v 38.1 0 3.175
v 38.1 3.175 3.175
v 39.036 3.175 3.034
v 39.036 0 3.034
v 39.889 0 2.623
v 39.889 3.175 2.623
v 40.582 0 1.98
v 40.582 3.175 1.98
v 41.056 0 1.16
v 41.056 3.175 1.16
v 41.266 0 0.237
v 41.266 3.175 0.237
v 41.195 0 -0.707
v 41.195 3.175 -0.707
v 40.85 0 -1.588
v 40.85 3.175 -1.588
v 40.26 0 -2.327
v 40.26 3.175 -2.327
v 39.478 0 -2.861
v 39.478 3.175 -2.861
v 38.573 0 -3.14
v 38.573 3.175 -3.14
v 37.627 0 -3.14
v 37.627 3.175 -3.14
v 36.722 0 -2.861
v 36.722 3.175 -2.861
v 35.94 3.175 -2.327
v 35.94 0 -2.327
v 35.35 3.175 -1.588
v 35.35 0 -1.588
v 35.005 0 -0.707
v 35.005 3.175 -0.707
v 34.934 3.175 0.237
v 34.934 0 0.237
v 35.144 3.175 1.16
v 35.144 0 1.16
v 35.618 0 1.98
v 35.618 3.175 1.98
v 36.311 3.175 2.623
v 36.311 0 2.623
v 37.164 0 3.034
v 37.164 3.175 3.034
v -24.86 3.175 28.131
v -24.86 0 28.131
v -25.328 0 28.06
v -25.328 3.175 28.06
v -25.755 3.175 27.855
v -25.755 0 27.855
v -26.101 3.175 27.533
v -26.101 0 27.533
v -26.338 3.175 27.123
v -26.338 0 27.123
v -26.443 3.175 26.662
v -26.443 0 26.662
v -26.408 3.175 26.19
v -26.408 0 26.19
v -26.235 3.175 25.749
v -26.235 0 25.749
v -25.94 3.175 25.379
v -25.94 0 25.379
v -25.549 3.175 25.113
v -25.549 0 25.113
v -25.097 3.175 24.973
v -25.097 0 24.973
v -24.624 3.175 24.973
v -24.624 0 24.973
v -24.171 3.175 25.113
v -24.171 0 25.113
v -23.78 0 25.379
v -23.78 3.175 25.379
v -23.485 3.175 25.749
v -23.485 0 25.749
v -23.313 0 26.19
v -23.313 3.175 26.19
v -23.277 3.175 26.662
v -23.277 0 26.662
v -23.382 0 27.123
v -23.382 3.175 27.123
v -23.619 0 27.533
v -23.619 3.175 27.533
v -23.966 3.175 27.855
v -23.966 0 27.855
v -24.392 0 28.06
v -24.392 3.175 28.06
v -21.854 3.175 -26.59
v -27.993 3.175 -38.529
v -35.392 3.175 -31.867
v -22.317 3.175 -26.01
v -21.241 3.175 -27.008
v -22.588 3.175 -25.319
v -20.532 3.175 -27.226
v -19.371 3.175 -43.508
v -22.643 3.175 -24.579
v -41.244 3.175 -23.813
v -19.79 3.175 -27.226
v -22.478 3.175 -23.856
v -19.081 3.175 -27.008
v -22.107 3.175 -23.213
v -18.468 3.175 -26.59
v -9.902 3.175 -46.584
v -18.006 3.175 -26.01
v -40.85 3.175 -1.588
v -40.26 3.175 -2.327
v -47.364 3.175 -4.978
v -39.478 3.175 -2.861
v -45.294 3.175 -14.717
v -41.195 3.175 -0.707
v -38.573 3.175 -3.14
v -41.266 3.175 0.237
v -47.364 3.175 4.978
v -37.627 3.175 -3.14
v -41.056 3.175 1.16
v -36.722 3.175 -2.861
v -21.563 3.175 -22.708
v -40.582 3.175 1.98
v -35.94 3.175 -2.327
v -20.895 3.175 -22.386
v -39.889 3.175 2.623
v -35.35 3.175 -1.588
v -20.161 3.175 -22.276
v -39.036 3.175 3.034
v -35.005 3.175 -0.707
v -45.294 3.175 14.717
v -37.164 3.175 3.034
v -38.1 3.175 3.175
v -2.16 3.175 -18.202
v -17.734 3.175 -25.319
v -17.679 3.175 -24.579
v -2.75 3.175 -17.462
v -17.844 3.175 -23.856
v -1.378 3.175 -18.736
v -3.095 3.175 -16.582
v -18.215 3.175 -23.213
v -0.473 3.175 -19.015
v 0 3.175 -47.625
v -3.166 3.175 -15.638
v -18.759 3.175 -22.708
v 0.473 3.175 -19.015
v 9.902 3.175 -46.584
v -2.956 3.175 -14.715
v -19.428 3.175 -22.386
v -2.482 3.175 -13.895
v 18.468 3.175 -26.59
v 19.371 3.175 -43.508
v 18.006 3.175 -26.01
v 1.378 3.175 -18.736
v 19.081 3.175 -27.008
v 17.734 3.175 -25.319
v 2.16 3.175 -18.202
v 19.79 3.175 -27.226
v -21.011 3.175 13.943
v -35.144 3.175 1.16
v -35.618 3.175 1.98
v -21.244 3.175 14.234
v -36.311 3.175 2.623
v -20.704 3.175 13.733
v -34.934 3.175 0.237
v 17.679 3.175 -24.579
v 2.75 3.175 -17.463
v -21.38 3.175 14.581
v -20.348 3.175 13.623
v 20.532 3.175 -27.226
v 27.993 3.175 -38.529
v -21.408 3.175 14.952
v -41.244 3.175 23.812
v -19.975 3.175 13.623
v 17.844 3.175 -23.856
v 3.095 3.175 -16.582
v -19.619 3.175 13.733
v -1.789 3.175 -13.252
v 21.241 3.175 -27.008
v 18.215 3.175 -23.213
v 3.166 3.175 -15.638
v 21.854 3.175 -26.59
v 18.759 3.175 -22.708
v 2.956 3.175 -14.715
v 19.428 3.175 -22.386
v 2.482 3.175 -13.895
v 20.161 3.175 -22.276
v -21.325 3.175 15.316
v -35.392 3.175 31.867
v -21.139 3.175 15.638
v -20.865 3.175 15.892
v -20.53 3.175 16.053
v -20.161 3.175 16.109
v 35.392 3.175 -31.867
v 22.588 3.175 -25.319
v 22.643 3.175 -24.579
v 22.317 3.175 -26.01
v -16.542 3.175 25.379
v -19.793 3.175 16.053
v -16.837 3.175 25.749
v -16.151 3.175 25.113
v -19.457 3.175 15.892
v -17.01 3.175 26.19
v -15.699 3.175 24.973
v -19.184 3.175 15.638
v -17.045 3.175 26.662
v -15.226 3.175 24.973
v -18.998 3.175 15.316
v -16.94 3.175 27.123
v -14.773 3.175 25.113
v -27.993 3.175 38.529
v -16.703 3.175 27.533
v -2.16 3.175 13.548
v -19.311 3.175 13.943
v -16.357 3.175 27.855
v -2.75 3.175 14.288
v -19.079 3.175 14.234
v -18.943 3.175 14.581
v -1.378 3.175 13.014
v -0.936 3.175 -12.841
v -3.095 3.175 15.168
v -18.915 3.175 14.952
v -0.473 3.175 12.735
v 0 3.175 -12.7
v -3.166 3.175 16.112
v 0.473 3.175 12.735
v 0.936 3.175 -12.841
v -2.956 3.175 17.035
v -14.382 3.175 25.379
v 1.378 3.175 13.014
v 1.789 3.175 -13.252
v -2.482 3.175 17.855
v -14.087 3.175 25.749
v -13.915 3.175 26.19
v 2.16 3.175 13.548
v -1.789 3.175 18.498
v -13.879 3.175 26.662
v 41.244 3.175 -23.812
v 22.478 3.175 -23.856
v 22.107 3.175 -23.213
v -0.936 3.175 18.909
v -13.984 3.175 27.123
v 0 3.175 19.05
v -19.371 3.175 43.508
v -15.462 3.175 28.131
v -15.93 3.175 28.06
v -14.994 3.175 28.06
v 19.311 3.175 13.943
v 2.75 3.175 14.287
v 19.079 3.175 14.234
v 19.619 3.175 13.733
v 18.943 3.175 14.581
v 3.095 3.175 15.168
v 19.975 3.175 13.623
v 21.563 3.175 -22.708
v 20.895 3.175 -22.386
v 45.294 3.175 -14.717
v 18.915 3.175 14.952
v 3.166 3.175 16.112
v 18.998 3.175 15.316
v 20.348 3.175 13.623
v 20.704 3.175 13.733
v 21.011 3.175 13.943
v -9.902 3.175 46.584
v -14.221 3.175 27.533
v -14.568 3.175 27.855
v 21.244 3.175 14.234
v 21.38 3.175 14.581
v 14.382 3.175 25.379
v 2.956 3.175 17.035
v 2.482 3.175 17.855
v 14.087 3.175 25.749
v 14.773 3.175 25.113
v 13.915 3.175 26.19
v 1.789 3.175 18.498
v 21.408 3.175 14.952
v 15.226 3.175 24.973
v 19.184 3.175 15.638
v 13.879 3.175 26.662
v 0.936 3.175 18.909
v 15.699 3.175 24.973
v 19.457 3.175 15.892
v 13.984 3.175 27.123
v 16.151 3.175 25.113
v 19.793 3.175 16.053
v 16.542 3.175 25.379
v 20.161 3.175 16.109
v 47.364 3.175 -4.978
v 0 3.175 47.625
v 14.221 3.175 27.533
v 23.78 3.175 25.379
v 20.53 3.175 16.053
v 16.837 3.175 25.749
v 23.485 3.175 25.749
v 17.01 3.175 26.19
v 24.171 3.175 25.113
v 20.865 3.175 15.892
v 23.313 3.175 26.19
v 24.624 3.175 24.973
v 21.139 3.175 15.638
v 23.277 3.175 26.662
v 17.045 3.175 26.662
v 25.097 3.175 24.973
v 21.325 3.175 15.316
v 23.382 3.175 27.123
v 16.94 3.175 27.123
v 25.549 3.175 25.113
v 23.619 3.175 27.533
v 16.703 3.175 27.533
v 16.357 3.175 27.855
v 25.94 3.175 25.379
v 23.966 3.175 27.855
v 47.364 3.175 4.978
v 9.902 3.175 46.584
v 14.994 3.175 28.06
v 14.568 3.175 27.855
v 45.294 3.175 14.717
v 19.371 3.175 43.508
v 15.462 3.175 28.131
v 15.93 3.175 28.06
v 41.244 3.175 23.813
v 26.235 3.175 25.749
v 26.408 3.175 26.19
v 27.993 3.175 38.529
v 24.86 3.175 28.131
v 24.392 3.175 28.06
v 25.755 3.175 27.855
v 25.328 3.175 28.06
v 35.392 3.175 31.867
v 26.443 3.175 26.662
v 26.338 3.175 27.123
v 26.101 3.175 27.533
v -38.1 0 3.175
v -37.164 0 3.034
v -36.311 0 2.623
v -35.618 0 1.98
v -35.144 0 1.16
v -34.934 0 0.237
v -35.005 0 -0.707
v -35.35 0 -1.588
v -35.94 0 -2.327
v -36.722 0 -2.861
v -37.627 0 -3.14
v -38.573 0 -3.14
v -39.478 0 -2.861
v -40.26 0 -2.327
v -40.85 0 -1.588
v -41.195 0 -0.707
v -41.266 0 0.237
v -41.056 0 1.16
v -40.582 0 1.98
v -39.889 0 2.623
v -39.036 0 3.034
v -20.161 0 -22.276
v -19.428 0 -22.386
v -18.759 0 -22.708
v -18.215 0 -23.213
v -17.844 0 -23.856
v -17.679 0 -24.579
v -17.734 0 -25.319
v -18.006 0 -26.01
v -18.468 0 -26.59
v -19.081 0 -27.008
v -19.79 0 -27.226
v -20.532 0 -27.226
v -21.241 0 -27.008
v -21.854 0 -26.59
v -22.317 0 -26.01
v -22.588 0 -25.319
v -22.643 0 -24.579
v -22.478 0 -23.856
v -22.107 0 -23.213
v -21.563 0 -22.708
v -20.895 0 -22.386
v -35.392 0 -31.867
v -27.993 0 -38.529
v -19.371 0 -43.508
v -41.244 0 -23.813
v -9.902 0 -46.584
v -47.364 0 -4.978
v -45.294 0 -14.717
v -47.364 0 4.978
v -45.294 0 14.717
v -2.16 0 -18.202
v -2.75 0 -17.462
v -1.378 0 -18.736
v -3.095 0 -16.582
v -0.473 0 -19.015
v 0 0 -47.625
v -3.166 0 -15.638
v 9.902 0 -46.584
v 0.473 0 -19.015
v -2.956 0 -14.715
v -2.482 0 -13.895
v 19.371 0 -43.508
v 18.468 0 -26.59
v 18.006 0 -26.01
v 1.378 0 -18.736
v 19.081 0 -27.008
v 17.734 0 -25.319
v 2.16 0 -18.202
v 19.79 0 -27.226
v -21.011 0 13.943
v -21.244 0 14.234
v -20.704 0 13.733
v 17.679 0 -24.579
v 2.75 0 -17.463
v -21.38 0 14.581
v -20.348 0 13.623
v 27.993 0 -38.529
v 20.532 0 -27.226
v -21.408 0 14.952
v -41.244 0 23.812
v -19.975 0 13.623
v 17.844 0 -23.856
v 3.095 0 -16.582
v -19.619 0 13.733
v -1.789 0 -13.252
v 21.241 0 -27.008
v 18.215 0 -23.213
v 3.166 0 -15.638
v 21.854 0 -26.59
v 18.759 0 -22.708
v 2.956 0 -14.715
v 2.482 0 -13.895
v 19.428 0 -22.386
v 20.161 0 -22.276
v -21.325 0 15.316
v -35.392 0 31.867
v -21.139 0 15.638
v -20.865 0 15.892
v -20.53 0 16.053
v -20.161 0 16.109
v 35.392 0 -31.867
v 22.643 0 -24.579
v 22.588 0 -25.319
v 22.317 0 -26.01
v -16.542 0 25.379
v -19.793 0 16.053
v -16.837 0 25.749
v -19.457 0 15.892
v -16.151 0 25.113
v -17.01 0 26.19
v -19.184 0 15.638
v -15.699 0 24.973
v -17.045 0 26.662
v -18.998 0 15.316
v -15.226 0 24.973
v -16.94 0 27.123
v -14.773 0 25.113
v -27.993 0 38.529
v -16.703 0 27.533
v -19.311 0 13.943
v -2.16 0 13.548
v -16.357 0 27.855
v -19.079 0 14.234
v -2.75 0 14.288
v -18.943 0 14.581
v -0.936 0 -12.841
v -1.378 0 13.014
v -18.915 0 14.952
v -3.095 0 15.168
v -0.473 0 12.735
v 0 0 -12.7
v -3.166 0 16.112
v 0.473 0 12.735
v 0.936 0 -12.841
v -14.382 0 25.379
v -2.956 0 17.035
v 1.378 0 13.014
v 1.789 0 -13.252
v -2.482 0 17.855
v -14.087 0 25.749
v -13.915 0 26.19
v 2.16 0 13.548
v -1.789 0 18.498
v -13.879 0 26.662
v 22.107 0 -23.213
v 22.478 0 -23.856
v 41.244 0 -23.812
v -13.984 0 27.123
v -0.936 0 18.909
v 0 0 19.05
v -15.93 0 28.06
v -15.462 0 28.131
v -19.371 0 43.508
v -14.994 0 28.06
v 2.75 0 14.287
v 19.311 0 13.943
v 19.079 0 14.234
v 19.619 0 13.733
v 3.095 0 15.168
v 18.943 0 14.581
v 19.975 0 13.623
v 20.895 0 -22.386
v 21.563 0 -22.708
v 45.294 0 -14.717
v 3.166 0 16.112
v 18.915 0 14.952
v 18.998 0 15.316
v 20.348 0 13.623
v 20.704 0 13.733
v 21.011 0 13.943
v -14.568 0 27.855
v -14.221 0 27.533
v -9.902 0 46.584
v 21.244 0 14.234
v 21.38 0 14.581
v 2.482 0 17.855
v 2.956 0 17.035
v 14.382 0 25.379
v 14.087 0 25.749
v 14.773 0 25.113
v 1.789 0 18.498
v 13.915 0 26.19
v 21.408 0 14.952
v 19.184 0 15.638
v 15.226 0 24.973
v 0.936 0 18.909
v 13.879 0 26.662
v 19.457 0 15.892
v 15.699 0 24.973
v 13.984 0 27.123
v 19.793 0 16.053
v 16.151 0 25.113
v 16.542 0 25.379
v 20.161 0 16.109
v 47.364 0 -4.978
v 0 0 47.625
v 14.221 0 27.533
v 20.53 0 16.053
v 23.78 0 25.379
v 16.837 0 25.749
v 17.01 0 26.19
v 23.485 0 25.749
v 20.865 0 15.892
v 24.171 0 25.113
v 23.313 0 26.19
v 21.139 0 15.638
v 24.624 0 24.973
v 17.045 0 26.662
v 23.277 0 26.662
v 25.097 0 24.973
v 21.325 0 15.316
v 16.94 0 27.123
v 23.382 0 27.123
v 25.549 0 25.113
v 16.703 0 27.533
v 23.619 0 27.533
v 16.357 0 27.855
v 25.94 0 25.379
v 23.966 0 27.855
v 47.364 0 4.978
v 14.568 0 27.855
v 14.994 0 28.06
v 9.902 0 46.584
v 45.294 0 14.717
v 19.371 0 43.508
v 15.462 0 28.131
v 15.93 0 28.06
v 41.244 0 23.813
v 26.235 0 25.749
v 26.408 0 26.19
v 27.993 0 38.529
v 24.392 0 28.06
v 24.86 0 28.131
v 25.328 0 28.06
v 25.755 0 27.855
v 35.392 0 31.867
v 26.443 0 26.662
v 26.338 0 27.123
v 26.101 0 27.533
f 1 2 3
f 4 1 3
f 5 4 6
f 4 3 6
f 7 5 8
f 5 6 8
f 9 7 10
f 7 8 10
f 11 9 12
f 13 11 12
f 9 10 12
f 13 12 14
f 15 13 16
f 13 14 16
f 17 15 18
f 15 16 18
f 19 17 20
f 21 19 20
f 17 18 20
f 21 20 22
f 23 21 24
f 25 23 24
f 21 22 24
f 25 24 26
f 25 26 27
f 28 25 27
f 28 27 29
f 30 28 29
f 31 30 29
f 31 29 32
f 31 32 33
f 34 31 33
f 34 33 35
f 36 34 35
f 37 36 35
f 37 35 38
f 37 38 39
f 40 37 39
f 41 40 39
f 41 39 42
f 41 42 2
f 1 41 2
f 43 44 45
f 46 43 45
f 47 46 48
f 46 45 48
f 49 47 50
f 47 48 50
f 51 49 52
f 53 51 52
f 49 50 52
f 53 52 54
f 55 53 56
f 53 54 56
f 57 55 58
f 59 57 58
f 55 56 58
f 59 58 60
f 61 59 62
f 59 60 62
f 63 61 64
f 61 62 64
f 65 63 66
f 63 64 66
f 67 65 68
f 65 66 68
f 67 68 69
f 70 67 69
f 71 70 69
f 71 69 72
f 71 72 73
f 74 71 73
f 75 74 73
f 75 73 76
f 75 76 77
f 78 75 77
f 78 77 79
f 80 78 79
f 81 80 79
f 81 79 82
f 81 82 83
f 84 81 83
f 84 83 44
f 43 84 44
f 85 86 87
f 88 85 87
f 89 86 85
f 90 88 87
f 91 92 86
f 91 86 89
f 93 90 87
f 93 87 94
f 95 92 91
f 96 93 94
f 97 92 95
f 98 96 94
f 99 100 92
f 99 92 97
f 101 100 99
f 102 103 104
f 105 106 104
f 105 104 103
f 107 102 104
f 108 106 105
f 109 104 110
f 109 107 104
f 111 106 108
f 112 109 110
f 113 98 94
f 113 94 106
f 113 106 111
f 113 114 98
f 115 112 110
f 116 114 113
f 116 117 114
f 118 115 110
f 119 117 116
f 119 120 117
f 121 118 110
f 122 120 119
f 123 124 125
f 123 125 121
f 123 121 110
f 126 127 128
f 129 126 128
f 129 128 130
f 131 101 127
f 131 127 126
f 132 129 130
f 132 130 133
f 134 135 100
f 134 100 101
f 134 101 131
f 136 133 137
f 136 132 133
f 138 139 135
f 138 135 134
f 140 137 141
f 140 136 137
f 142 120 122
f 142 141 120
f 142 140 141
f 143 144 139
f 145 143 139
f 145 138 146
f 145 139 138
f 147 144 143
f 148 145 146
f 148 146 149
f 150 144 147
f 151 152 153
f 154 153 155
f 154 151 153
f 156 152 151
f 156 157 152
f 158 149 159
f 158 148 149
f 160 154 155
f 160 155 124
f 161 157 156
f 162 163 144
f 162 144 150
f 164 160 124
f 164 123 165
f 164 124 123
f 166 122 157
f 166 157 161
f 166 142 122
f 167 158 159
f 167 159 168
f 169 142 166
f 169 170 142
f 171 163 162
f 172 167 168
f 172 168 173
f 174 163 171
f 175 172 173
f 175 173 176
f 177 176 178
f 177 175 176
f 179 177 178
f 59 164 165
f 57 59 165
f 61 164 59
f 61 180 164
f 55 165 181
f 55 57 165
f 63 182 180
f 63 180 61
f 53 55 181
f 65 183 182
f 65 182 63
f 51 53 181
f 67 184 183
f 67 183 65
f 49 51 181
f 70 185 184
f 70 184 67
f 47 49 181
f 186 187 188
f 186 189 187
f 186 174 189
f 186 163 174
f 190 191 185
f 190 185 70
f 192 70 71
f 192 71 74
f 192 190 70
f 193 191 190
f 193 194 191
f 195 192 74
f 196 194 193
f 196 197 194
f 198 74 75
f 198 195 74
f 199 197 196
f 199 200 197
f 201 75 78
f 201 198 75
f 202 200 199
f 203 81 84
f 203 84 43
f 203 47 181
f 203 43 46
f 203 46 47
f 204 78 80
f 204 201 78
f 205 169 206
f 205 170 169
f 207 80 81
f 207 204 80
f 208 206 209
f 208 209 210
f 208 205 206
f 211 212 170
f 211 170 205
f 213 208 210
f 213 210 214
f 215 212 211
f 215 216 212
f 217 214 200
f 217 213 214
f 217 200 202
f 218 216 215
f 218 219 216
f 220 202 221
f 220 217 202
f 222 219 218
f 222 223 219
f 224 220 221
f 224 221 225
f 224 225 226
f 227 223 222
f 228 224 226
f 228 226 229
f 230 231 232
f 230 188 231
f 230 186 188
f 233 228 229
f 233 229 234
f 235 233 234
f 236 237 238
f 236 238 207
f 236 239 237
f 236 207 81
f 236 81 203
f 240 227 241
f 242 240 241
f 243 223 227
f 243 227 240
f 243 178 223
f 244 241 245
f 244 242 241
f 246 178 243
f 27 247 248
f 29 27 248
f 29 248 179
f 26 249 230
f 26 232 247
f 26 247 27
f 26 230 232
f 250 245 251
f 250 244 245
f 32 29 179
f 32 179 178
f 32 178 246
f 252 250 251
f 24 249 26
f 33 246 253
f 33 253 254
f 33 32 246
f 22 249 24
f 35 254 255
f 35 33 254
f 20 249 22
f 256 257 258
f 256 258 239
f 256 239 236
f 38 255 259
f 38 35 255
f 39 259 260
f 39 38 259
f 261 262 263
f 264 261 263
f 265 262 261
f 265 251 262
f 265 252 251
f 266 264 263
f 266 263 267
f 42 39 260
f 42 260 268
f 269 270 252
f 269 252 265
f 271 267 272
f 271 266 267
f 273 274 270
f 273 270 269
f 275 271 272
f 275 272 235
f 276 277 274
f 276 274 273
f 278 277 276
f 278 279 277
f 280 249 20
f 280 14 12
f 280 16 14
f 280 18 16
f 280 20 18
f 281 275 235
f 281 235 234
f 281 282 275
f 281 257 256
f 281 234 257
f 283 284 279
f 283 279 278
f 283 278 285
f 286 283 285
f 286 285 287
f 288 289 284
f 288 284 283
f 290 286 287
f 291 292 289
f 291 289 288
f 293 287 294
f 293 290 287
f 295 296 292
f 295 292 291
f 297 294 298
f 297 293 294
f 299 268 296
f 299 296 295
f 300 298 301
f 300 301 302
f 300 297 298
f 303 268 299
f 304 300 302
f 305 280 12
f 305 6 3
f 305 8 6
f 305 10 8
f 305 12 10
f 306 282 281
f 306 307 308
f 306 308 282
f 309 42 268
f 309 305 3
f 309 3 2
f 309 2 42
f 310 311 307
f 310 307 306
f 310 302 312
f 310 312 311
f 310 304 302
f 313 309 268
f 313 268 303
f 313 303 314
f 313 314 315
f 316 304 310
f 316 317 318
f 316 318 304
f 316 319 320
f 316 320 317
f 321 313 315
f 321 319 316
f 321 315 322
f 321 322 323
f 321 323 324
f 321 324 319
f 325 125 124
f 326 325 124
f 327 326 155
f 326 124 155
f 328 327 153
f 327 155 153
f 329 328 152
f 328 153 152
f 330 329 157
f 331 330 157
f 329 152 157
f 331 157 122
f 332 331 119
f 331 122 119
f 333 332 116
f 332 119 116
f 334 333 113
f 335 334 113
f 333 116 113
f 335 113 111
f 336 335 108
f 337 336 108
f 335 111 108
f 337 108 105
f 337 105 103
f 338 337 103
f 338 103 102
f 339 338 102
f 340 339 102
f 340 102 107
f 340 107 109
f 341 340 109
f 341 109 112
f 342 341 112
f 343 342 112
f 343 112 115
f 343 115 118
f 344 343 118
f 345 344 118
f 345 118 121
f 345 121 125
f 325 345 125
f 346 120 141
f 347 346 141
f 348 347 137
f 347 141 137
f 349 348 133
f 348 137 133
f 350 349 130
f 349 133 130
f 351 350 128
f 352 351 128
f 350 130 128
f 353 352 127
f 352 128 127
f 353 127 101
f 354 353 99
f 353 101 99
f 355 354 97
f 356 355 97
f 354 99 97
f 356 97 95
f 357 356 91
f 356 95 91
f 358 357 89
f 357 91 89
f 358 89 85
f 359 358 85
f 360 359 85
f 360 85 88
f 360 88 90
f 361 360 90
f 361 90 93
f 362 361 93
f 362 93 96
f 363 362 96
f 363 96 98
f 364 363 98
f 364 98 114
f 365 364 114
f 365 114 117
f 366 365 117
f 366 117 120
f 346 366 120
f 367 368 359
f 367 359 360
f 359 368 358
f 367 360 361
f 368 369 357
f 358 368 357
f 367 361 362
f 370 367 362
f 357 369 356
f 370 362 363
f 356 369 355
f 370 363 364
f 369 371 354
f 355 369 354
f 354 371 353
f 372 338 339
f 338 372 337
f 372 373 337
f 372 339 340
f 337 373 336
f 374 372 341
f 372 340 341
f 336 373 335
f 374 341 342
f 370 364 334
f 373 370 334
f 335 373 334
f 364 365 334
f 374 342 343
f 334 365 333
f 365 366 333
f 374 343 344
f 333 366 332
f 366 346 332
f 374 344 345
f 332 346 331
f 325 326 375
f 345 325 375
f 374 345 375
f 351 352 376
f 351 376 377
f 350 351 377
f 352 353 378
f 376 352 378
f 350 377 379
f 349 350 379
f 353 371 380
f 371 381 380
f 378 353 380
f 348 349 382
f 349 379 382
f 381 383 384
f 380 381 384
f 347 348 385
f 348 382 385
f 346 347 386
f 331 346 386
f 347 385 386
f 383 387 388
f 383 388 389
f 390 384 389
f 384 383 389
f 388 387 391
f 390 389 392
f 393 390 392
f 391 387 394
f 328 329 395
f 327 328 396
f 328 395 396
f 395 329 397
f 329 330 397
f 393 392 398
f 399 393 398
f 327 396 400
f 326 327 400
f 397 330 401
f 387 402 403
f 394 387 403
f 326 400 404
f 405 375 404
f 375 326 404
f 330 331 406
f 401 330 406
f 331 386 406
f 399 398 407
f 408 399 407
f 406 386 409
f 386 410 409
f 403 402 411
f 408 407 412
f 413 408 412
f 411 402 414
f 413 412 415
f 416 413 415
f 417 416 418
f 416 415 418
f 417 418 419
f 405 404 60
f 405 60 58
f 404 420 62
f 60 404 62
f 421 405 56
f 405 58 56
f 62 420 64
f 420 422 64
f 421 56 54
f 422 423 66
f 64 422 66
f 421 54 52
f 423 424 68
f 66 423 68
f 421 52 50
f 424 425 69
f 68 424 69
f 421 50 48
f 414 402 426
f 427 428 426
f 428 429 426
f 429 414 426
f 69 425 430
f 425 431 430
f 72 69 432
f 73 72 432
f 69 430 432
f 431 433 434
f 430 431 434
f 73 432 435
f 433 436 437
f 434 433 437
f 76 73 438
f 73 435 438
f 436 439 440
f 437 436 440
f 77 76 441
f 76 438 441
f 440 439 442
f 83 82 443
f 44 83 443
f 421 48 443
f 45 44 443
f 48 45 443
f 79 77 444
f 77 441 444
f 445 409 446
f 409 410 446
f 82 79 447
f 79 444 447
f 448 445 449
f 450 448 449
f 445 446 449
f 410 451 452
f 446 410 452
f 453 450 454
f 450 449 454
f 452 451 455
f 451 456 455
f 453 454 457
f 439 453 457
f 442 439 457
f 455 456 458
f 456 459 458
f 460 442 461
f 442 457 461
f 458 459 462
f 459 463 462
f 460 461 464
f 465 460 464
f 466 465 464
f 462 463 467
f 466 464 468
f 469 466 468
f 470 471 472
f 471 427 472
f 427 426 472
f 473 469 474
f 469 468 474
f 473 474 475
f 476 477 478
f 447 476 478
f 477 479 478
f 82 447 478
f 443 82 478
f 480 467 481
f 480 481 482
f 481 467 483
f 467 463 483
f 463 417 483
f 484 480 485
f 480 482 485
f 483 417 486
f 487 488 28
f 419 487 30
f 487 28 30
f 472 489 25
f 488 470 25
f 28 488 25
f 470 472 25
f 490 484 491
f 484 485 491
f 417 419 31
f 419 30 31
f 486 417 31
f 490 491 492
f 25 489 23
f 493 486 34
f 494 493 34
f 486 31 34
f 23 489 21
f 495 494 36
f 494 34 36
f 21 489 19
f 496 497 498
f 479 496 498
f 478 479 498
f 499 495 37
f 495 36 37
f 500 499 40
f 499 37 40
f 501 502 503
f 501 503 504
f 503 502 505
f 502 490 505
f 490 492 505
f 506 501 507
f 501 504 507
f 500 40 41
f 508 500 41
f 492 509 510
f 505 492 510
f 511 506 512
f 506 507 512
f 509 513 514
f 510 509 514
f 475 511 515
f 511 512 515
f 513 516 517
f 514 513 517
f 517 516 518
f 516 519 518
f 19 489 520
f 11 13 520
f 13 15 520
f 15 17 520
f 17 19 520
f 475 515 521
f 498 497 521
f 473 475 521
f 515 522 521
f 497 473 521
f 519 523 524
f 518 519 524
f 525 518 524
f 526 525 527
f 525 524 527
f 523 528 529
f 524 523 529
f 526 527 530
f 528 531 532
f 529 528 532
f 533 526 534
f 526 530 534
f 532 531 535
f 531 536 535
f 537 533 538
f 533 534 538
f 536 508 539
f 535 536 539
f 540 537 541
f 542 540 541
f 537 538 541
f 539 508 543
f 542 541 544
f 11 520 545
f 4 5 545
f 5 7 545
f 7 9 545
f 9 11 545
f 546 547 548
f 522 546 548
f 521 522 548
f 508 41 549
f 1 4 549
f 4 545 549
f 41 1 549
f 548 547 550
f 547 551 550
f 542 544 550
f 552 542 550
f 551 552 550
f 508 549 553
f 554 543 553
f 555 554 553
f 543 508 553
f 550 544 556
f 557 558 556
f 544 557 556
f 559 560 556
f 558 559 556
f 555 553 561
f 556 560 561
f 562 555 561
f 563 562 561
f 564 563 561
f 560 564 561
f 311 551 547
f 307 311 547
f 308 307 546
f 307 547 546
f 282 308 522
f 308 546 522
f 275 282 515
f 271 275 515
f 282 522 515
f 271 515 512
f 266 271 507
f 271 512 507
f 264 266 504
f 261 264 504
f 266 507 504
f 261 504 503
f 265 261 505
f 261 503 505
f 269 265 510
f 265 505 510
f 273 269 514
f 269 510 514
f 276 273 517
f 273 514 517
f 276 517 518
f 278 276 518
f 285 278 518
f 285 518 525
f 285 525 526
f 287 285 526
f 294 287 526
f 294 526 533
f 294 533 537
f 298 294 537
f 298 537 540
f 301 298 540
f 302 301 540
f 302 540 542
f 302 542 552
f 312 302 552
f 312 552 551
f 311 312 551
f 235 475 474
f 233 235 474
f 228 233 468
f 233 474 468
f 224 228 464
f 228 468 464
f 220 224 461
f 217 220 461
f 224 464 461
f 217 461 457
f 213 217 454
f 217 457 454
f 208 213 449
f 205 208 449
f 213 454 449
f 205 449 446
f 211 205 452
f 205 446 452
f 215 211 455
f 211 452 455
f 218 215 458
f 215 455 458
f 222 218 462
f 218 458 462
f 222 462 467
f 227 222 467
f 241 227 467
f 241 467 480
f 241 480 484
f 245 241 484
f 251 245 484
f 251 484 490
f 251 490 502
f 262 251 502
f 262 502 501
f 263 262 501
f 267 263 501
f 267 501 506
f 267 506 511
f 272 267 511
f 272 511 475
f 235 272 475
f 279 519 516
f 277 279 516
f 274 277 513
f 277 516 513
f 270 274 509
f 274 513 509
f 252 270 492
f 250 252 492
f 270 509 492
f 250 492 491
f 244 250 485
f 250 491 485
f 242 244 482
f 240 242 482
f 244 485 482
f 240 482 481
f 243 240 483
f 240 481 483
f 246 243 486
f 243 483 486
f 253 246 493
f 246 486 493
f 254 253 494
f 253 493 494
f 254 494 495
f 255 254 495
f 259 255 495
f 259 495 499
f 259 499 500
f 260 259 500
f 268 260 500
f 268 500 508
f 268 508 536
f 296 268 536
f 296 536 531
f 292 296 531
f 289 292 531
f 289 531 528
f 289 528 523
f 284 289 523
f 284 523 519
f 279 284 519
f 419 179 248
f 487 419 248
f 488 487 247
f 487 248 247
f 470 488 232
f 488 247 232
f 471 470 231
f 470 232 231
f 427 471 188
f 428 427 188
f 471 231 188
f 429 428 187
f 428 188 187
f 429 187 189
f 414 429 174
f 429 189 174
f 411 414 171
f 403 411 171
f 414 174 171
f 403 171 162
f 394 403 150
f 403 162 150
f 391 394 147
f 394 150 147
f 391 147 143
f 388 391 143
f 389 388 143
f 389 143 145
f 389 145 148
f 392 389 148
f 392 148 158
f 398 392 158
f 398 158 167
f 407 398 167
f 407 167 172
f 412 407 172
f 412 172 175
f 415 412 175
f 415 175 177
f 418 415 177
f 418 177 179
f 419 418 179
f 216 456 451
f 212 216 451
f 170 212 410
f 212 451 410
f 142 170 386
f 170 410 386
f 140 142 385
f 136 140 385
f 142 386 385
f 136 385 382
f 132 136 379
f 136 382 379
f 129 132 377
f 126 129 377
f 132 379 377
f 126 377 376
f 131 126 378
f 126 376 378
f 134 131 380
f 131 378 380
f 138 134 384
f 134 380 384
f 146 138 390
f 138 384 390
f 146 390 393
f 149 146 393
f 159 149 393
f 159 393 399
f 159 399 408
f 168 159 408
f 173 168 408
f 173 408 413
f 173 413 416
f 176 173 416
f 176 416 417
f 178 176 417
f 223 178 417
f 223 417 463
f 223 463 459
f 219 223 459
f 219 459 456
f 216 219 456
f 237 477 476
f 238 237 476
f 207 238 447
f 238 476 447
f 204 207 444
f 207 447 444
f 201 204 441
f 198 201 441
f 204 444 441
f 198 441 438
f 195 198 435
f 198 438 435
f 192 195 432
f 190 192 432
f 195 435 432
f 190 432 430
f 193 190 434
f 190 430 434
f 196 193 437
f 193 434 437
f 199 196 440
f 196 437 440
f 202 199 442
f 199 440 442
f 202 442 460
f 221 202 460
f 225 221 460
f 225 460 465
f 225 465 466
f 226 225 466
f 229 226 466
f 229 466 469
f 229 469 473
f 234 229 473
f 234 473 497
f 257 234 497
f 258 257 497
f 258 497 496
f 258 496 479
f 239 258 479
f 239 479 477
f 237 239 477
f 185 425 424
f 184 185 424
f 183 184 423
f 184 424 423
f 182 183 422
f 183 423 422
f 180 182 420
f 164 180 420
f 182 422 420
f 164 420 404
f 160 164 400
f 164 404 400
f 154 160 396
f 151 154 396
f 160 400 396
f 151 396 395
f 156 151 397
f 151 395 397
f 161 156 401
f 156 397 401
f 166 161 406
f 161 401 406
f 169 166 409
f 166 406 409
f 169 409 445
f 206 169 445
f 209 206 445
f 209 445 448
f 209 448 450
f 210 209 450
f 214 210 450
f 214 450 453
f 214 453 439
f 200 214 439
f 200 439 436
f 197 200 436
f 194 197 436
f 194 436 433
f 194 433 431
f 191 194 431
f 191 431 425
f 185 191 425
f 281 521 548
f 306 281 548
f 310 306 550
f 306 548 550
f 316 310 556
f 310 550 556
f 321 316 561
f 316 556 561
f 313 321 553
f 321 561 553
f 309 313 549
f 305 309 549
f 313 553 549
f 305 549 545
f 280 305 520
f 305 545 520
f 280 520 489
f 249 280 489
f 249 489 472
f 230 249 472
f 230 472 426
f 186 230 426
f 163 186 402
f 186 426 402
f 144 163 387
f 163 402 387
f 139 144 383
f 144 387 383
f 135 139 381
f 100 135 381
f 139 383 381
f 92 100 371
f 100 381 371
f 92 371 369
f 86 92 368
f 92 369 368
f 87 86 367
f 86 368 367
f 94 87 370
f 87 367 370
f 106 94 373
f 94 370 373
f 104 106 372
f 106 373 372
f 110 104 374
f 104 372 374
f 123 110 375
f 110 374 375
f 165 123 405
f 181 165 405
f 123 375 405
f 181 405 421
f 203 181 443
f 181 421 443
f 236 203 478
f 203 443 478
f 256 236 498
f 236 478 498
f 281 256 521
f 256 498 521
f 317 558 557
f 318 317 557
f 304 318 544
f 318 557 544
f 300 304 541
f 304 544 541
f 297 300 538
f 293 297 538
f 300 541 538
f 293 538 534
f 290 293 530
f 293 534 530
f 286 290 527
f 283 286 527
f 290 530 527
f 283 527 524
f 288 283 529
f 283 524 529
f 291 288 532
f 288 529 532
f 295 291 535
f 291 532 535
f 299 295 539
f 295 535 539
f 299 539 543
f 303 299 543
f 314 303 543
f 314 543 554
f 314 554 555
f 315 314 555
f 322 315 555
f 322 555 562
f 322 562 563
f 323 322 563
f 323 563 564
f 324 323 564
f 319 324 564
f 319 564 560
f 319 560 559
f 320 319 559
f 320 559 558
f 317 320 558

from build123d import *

# Parameters (mm, degrees)
SKETCH1_R           = 47.625
BOSS_EXTRUDE1_DEPTH = 3.175
SKETCH2_R           = 3.175
CUT_EXTRUDE1_DEPTH  = 263.398
SKETCH3_R           = 3.175
CUT_EXTRUDE2_DEPTH  = 25.4
SKETCH4_R           = 1.5875
SKETCH4_R_2         = 1.25
CUT_EXTRUDE3_DEPTH  = 50.8
CUT_EXTRUDE4_START  = -3.175
SKETCH5_R           = 1.984375
CUT_EXTRUDE4_DEPTH  = 50.8
SKETCH6_R           = 2.4892
CUT_EXTRUDE5_DEPTH  = 25.4


with BuildPart() as part:
    # Sketch1 → Boss-Extrude1 (new body)
    with BuildSketch(Plane(origin=(0, 0, 0), x_dir=(1, 0, 0), z_dir=(0, 1, 0))):
        with Locations(Location((0, 0, 0), (0, 0, 270))):
            Circle(SKETCH1_R)
    extrude(amount=BOSS_EXTRUDE1_DEPTH)

    # Sketch2 → Cut-Extrude1 (cut)
    with BuildSketch(Plane(origin=(-55.039702575, 231.775, -116.088398355), x_dir=(-1, 0, 0), z_dir=(0, 1, 0))):
        with Locations(Location((-93.139702575, 116.088398355, 0), (0, 0, 90))):
            Circle(SKETCH2_R)
        with Locations(Location((-16.939702575, 116.088398355, 0), (0, 0, 90))):
            Circle(SKETCH2_R)
    extrude(amount=-CUT_EXTRUDE1_DEPTH, mode=Mode.SUBTRACT)

    # Sketch3 → Cut-Extrude2 (cut)
    with BuildSketch(Plane(origin=(-28.264398128, -3.175, -82.371298873), x_dir=(1, 0, 0), z_dir=(0, -1, 0))):
        with Locations(Location((28.264398128, 98.246298873, 0), (0, 0, 90))):
            Circle(SKETCH3_R)
        with Locations(Location((28.264398128, 66.496298873, 0), (0, 0, 90))):
            Circle(SKETCH3_R)
    extrude(amount=-CUT_EXTRUDE2_DEPTH, mode=Mode.SUBTRACT)

    # Sketch4 → Cut-Extrude3 (cut)
    with BuildSketch(Plane(origin=(-28.264398128, -3.175, -82.371298873), x_dir=(-1, 0, 0), z_dir=(0, -1, 0))):
        with Locations(Location((-3.404148128, -108.914298873, 0), (0, 0, 270))):
            Circle(SKETCH4_R)
        with Locations(Location((-12.802148128, -108.914298873, 0), (0, 0, 270))):
            Circle(SKETCH4_R)
        with Locations(Location((-43.726648128, -108.914298873, 0), (0, 0, 270))):
            Circle(SKETCH4_R)
        with Locations(Location((-53.124648128, -108.914298873, 0), (0, 0, 270))):
            Circle(SKETCH4_R)
        with Locations(Location((-8.103148128, -97.230298873, 0), (0, 0, 270))):
            Circle(SKETCH4_R_2)
        with Locations(Location((-48.425648128, -97.230298873, 0), (0, 0, 270))):
            Circle(SKETCH4_R_2)
    extrude(amount=-CUT_EXTRUDE3_DEPTH, mode=Mode.SUBTRACT)

    # Sketch5 → Cut-Extrude4 (cut)
    with BuildSketch(Plane(origin=(-28.264398128, -3.175, -82.371298873), x_dir=(1, 0, 0), z_dir=(0, -1, 0)).offset(CUT_EXTRUDE4_START)):
        with Locations(Location((8.103148128, 57.606298873, 0), (0, 0, 90))):
            Circle(SKETCH5_R)
        with Locations(Location((48.425648128, 57.606298873, 0), (0, 0, 90))):
            Circle(SKETCH5_R)
    extrude(amount=-CUT_EXTRUDE4_DEPTH, mode=Mode.SUBTRACT)

    # Sketch6 → Cut-Extrude5 (cut)
    with BuildSketch(Plane(origin=(-28.264398128, 3.175, -82.371298873), x_dir=(1, 0, 0), z_dir=(0, 1, 0))):
        with Locations(Location((8.103148128, -57.606298873, 0), (0, 0, 270))):
            Circle(SKETCH6_R)
        with Locations(Location((48.425648128, -57.606298873, 0), (0, 0, 270))):
            Circle(SKETCH6_R)
    extrude(amount=-CUT_EXTRUDE5_DEPTH, mode=Mode.SUBTRACT)


solid = part.part
